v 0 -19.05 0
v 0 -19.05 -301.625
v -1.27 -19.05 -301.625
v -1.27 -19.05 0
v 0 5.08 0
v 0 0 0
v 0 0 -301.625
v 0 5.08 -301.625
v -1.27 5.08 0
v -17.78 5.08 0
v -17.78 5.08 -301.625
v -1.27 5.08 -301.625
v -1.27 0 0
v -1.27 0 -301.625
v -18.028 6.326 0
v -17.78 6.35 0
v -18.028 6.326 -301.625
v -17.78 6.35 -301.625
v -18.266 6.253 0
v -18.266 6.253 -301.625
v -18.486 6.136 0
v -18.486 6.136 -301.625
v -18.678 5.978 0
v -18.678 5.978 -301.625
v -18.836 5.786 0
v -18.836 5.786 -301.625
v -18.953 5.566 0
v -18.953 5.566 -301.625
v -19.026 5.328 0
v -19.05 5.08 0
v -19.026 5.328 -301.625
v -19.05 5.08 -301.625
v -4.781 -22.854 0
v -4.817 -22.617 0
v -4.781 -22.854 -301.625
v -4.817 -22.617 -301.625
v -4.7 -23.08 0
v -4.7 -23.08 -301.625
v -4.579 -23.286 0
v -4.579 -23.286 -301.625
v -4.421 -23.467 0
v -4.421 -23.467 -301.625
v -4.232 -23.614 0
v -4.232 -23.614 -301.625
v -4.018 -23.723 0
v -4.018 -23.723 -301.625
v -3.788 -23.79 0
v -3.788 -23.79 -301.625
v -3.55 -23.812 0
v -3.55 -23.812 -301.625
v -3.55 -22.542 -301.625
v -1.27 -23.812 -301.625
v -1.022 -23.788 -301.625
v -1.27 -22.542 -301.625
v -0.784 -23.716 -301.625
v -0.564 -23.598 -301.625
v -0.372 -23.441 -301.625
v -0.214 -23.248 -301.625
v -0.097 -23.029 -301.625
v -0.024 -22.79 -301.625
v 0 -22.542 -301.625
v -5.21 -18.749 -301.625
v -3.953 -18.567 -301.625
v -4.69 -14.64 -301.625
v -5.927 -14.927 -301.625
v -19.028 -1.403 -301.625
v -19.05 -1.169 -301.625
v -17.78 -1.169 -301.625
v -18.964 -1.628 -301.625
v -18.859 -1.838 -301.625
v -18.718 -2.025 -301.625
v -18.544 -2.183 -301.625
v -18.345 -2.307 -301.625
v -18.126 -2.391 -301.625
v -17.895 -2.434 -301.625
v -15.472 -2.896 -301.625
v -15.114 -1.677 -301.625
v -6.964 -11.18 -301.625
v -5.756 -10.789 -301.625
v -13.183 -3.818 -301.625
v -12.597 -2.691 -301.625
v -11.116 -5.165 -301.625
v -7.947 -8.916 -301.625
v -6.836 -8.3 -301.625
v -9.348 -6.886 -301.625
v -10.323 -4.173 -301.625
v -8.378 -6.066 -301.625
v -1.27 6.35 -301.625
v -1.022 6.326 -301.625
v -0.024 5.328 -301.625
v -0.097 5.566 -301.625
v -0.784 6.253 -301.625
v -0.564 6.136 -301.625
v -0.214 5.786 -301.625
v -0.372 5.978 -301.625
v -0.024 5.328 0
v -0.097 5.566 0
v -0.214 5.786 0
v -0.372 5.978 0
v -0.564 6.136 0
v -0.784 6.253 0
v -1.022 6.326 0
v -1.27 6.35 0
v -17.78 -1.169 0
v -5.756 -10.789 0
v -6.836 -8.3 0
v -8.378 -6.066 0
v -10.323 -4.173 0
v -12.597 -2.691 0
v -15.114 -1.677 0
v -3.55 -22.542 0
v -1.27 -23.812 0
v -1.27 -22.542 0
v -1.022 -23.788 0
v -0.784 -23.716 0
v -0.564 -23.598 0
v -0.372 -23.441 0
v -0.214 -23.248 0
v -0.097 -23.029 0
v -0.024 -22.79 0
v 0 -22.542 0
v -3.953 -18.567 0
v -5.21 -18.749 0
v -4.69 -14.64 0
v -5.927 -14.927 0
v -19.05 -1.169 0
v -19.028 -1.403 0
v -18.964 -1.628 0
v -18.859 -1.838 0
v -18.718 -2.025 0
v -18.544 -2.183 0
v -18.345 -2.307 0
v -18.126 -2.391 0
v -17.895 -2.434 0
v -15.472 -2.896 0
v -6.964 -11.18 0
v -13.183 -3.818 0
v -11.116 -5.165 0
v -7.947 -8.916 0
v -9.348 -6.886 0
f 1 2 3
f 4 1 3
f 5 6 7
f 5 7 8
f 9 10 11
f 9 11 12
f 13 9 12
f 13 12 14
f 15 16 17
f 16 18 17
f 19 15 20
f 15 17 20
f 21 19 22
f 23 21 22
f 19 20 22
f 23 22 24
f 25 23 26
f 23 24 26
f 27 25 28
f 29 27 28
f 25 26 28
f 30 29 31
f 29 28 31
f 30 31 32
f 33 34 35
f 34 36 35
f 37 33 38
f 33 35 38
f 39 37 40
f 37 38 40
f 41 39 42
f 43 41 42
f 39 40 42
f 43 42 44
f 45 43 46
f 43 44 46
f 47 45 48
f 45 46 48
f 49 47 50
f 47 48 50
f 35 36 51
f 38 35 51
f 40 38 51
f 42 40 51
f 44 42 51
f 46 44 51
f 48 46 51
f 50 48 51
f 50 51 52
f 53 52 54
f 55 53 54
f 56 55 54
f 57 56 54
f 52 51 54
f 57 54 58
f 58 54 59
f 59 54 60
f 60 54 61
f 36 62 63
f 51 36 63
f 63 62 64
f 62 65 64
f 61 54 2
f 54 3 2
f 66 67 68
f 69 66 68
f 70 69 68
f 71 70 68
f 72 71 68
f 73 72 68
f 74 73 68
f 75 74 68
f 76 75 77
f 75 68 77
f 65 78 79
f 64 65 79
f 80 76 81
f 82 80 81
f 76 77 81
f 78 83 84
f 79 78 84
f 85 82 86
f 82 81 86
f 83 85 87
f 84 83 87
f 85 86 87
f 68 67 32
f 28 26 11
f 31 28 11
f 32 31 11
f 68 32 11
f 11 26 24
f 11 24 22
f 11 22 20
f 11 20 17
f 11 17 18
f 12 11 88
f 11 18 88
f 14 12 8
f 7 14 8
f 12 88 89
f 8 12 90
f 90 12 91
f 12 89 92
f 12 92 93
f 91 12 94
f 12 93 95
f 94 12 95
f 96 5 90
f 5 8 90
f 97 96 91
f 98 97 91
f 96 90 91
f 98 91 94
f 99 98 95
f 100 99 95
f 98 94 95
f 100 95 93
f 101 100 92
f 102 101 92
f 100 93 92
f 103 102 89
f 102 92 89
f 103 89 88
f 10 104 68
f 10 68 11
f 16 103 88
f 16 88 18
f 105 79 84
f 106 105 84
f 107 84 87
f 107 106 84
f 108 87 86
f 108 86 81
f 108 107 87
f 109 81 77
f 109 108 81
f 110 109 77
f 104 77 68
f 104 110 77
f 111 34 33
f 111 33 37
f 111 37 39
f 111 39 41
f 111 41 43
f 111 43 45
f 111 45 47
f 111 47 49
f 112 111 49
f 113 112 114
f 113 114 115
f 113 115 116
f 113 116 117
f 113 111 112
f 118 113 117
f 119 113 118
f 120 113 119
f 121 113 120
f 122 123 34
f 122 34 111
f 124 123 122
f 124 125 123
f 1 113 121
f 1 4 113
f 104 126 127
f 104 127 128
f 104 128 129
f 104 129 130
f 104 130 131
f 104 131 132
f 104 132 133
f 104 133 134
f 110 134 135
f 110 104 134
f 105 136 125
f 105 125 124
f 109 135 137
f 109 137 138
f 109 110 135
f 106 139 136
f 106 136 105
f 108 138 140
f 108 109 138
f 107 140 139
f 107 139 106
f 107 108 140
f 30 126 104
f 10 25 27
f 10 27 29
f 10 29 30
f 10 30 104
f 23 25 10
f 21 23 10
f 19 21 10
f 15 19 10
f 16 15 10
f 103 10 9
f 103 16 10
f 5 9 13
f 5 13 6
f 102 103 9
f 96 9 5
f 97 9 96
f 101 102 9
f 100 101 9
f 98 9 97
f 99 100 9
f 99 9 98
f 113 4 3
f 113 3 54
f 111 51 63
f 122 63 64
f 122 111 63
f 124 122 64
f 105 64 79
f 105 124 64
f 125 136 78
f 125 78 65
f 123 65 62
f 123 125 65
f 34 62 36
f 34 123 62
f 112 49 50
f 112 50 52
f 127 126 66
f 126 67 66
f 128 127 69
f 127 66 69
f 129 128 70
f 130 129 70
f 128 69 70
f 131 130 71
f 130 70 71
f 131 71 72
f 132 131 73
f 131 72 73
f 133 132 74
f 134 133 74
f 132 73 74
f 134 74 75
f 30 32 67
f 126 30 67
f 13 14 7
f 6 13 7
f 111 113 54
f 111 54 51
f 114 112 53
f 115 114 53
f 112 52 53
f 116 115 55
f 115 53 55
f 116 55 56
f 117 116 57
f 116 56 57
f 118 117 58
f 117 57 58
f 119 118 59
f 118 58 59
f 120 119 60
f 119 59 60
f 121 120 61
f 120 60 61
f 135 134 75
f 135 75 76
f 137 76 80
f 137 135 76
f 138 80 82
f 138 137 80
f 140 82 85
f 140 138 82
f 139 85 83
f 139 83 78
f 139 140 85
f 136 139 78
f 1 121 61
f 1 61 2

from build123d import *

# Parameters (mm, degrees)
EXTRUDE_THIN1_DEPTH = 301.625
FILLET1_R           = 1.27


with BuildPart() as part:
    # Sketch1 → Extrude-Thin1 (new body)
    with BuildSketch(Plane.XY):
        with BuildLine():
            Line((0, 0), (0, 6.35))
            Line((0, 6.35), (-19.05, 6.35))
            Line((-19.05, 6.35), (-19.05, -2.38125))
            ThreePointArc((-19.05, -2.38125), (-11.575450433, -4.813771791), (-6.964208693, -11.179500588))
            ThreePointArc((-6.964208693, -11.179500588), (-5.421346287, -17.418966095), (-4.7625, -23.8125))
            Line((-4.7625, -23.8125), (0, -23.8125))
            Line((0, -23.8125), (0, -19.05))
            Line((0, -19.05), (-1.27, -19.05))
            Line((-1.27, -19.05), (-1.27, -22.5425))
            Line((-1.27, -22.5425), (-3.549505015, -22.5425))
            ThreePointArc((-3.549505015, -22.5425), (-4.279699966, -16.595923923), (-5.755629562, -10.789325647))
            ThreePointArc((-5.755629562, -10.789325647), (-10.322605132, -4.172836787), (-17.78, -1.169097039))
            Line((-17.78, -1.169097039), (-17.78, 5.08))
            Line((-17.78, 5.08), (-1.27, 5.08))
            Line((-1.27, 5.08), (-1.27, 0))
            Line((-1.27, 0), (0, 0))
        make_face()
    extrude(amount=-EXTRUDE_THIN1_DEPTH)

    # Fillet1
    fillet1_edges = [part.edges().sort_by_distance(p)[0] for p in [
        (0, -23.8125, -150.8125),
        (-4.7625, -23.8125, -150.8125),
        (-19.05, -2.38125, -150.8125),
        (-19.05, 6.35, -150.8125),
        (0, 6.35, -150.8125),
    ]]
    fillet(fillet1_edges, radius=FILLET1_R)


solid = part.part
